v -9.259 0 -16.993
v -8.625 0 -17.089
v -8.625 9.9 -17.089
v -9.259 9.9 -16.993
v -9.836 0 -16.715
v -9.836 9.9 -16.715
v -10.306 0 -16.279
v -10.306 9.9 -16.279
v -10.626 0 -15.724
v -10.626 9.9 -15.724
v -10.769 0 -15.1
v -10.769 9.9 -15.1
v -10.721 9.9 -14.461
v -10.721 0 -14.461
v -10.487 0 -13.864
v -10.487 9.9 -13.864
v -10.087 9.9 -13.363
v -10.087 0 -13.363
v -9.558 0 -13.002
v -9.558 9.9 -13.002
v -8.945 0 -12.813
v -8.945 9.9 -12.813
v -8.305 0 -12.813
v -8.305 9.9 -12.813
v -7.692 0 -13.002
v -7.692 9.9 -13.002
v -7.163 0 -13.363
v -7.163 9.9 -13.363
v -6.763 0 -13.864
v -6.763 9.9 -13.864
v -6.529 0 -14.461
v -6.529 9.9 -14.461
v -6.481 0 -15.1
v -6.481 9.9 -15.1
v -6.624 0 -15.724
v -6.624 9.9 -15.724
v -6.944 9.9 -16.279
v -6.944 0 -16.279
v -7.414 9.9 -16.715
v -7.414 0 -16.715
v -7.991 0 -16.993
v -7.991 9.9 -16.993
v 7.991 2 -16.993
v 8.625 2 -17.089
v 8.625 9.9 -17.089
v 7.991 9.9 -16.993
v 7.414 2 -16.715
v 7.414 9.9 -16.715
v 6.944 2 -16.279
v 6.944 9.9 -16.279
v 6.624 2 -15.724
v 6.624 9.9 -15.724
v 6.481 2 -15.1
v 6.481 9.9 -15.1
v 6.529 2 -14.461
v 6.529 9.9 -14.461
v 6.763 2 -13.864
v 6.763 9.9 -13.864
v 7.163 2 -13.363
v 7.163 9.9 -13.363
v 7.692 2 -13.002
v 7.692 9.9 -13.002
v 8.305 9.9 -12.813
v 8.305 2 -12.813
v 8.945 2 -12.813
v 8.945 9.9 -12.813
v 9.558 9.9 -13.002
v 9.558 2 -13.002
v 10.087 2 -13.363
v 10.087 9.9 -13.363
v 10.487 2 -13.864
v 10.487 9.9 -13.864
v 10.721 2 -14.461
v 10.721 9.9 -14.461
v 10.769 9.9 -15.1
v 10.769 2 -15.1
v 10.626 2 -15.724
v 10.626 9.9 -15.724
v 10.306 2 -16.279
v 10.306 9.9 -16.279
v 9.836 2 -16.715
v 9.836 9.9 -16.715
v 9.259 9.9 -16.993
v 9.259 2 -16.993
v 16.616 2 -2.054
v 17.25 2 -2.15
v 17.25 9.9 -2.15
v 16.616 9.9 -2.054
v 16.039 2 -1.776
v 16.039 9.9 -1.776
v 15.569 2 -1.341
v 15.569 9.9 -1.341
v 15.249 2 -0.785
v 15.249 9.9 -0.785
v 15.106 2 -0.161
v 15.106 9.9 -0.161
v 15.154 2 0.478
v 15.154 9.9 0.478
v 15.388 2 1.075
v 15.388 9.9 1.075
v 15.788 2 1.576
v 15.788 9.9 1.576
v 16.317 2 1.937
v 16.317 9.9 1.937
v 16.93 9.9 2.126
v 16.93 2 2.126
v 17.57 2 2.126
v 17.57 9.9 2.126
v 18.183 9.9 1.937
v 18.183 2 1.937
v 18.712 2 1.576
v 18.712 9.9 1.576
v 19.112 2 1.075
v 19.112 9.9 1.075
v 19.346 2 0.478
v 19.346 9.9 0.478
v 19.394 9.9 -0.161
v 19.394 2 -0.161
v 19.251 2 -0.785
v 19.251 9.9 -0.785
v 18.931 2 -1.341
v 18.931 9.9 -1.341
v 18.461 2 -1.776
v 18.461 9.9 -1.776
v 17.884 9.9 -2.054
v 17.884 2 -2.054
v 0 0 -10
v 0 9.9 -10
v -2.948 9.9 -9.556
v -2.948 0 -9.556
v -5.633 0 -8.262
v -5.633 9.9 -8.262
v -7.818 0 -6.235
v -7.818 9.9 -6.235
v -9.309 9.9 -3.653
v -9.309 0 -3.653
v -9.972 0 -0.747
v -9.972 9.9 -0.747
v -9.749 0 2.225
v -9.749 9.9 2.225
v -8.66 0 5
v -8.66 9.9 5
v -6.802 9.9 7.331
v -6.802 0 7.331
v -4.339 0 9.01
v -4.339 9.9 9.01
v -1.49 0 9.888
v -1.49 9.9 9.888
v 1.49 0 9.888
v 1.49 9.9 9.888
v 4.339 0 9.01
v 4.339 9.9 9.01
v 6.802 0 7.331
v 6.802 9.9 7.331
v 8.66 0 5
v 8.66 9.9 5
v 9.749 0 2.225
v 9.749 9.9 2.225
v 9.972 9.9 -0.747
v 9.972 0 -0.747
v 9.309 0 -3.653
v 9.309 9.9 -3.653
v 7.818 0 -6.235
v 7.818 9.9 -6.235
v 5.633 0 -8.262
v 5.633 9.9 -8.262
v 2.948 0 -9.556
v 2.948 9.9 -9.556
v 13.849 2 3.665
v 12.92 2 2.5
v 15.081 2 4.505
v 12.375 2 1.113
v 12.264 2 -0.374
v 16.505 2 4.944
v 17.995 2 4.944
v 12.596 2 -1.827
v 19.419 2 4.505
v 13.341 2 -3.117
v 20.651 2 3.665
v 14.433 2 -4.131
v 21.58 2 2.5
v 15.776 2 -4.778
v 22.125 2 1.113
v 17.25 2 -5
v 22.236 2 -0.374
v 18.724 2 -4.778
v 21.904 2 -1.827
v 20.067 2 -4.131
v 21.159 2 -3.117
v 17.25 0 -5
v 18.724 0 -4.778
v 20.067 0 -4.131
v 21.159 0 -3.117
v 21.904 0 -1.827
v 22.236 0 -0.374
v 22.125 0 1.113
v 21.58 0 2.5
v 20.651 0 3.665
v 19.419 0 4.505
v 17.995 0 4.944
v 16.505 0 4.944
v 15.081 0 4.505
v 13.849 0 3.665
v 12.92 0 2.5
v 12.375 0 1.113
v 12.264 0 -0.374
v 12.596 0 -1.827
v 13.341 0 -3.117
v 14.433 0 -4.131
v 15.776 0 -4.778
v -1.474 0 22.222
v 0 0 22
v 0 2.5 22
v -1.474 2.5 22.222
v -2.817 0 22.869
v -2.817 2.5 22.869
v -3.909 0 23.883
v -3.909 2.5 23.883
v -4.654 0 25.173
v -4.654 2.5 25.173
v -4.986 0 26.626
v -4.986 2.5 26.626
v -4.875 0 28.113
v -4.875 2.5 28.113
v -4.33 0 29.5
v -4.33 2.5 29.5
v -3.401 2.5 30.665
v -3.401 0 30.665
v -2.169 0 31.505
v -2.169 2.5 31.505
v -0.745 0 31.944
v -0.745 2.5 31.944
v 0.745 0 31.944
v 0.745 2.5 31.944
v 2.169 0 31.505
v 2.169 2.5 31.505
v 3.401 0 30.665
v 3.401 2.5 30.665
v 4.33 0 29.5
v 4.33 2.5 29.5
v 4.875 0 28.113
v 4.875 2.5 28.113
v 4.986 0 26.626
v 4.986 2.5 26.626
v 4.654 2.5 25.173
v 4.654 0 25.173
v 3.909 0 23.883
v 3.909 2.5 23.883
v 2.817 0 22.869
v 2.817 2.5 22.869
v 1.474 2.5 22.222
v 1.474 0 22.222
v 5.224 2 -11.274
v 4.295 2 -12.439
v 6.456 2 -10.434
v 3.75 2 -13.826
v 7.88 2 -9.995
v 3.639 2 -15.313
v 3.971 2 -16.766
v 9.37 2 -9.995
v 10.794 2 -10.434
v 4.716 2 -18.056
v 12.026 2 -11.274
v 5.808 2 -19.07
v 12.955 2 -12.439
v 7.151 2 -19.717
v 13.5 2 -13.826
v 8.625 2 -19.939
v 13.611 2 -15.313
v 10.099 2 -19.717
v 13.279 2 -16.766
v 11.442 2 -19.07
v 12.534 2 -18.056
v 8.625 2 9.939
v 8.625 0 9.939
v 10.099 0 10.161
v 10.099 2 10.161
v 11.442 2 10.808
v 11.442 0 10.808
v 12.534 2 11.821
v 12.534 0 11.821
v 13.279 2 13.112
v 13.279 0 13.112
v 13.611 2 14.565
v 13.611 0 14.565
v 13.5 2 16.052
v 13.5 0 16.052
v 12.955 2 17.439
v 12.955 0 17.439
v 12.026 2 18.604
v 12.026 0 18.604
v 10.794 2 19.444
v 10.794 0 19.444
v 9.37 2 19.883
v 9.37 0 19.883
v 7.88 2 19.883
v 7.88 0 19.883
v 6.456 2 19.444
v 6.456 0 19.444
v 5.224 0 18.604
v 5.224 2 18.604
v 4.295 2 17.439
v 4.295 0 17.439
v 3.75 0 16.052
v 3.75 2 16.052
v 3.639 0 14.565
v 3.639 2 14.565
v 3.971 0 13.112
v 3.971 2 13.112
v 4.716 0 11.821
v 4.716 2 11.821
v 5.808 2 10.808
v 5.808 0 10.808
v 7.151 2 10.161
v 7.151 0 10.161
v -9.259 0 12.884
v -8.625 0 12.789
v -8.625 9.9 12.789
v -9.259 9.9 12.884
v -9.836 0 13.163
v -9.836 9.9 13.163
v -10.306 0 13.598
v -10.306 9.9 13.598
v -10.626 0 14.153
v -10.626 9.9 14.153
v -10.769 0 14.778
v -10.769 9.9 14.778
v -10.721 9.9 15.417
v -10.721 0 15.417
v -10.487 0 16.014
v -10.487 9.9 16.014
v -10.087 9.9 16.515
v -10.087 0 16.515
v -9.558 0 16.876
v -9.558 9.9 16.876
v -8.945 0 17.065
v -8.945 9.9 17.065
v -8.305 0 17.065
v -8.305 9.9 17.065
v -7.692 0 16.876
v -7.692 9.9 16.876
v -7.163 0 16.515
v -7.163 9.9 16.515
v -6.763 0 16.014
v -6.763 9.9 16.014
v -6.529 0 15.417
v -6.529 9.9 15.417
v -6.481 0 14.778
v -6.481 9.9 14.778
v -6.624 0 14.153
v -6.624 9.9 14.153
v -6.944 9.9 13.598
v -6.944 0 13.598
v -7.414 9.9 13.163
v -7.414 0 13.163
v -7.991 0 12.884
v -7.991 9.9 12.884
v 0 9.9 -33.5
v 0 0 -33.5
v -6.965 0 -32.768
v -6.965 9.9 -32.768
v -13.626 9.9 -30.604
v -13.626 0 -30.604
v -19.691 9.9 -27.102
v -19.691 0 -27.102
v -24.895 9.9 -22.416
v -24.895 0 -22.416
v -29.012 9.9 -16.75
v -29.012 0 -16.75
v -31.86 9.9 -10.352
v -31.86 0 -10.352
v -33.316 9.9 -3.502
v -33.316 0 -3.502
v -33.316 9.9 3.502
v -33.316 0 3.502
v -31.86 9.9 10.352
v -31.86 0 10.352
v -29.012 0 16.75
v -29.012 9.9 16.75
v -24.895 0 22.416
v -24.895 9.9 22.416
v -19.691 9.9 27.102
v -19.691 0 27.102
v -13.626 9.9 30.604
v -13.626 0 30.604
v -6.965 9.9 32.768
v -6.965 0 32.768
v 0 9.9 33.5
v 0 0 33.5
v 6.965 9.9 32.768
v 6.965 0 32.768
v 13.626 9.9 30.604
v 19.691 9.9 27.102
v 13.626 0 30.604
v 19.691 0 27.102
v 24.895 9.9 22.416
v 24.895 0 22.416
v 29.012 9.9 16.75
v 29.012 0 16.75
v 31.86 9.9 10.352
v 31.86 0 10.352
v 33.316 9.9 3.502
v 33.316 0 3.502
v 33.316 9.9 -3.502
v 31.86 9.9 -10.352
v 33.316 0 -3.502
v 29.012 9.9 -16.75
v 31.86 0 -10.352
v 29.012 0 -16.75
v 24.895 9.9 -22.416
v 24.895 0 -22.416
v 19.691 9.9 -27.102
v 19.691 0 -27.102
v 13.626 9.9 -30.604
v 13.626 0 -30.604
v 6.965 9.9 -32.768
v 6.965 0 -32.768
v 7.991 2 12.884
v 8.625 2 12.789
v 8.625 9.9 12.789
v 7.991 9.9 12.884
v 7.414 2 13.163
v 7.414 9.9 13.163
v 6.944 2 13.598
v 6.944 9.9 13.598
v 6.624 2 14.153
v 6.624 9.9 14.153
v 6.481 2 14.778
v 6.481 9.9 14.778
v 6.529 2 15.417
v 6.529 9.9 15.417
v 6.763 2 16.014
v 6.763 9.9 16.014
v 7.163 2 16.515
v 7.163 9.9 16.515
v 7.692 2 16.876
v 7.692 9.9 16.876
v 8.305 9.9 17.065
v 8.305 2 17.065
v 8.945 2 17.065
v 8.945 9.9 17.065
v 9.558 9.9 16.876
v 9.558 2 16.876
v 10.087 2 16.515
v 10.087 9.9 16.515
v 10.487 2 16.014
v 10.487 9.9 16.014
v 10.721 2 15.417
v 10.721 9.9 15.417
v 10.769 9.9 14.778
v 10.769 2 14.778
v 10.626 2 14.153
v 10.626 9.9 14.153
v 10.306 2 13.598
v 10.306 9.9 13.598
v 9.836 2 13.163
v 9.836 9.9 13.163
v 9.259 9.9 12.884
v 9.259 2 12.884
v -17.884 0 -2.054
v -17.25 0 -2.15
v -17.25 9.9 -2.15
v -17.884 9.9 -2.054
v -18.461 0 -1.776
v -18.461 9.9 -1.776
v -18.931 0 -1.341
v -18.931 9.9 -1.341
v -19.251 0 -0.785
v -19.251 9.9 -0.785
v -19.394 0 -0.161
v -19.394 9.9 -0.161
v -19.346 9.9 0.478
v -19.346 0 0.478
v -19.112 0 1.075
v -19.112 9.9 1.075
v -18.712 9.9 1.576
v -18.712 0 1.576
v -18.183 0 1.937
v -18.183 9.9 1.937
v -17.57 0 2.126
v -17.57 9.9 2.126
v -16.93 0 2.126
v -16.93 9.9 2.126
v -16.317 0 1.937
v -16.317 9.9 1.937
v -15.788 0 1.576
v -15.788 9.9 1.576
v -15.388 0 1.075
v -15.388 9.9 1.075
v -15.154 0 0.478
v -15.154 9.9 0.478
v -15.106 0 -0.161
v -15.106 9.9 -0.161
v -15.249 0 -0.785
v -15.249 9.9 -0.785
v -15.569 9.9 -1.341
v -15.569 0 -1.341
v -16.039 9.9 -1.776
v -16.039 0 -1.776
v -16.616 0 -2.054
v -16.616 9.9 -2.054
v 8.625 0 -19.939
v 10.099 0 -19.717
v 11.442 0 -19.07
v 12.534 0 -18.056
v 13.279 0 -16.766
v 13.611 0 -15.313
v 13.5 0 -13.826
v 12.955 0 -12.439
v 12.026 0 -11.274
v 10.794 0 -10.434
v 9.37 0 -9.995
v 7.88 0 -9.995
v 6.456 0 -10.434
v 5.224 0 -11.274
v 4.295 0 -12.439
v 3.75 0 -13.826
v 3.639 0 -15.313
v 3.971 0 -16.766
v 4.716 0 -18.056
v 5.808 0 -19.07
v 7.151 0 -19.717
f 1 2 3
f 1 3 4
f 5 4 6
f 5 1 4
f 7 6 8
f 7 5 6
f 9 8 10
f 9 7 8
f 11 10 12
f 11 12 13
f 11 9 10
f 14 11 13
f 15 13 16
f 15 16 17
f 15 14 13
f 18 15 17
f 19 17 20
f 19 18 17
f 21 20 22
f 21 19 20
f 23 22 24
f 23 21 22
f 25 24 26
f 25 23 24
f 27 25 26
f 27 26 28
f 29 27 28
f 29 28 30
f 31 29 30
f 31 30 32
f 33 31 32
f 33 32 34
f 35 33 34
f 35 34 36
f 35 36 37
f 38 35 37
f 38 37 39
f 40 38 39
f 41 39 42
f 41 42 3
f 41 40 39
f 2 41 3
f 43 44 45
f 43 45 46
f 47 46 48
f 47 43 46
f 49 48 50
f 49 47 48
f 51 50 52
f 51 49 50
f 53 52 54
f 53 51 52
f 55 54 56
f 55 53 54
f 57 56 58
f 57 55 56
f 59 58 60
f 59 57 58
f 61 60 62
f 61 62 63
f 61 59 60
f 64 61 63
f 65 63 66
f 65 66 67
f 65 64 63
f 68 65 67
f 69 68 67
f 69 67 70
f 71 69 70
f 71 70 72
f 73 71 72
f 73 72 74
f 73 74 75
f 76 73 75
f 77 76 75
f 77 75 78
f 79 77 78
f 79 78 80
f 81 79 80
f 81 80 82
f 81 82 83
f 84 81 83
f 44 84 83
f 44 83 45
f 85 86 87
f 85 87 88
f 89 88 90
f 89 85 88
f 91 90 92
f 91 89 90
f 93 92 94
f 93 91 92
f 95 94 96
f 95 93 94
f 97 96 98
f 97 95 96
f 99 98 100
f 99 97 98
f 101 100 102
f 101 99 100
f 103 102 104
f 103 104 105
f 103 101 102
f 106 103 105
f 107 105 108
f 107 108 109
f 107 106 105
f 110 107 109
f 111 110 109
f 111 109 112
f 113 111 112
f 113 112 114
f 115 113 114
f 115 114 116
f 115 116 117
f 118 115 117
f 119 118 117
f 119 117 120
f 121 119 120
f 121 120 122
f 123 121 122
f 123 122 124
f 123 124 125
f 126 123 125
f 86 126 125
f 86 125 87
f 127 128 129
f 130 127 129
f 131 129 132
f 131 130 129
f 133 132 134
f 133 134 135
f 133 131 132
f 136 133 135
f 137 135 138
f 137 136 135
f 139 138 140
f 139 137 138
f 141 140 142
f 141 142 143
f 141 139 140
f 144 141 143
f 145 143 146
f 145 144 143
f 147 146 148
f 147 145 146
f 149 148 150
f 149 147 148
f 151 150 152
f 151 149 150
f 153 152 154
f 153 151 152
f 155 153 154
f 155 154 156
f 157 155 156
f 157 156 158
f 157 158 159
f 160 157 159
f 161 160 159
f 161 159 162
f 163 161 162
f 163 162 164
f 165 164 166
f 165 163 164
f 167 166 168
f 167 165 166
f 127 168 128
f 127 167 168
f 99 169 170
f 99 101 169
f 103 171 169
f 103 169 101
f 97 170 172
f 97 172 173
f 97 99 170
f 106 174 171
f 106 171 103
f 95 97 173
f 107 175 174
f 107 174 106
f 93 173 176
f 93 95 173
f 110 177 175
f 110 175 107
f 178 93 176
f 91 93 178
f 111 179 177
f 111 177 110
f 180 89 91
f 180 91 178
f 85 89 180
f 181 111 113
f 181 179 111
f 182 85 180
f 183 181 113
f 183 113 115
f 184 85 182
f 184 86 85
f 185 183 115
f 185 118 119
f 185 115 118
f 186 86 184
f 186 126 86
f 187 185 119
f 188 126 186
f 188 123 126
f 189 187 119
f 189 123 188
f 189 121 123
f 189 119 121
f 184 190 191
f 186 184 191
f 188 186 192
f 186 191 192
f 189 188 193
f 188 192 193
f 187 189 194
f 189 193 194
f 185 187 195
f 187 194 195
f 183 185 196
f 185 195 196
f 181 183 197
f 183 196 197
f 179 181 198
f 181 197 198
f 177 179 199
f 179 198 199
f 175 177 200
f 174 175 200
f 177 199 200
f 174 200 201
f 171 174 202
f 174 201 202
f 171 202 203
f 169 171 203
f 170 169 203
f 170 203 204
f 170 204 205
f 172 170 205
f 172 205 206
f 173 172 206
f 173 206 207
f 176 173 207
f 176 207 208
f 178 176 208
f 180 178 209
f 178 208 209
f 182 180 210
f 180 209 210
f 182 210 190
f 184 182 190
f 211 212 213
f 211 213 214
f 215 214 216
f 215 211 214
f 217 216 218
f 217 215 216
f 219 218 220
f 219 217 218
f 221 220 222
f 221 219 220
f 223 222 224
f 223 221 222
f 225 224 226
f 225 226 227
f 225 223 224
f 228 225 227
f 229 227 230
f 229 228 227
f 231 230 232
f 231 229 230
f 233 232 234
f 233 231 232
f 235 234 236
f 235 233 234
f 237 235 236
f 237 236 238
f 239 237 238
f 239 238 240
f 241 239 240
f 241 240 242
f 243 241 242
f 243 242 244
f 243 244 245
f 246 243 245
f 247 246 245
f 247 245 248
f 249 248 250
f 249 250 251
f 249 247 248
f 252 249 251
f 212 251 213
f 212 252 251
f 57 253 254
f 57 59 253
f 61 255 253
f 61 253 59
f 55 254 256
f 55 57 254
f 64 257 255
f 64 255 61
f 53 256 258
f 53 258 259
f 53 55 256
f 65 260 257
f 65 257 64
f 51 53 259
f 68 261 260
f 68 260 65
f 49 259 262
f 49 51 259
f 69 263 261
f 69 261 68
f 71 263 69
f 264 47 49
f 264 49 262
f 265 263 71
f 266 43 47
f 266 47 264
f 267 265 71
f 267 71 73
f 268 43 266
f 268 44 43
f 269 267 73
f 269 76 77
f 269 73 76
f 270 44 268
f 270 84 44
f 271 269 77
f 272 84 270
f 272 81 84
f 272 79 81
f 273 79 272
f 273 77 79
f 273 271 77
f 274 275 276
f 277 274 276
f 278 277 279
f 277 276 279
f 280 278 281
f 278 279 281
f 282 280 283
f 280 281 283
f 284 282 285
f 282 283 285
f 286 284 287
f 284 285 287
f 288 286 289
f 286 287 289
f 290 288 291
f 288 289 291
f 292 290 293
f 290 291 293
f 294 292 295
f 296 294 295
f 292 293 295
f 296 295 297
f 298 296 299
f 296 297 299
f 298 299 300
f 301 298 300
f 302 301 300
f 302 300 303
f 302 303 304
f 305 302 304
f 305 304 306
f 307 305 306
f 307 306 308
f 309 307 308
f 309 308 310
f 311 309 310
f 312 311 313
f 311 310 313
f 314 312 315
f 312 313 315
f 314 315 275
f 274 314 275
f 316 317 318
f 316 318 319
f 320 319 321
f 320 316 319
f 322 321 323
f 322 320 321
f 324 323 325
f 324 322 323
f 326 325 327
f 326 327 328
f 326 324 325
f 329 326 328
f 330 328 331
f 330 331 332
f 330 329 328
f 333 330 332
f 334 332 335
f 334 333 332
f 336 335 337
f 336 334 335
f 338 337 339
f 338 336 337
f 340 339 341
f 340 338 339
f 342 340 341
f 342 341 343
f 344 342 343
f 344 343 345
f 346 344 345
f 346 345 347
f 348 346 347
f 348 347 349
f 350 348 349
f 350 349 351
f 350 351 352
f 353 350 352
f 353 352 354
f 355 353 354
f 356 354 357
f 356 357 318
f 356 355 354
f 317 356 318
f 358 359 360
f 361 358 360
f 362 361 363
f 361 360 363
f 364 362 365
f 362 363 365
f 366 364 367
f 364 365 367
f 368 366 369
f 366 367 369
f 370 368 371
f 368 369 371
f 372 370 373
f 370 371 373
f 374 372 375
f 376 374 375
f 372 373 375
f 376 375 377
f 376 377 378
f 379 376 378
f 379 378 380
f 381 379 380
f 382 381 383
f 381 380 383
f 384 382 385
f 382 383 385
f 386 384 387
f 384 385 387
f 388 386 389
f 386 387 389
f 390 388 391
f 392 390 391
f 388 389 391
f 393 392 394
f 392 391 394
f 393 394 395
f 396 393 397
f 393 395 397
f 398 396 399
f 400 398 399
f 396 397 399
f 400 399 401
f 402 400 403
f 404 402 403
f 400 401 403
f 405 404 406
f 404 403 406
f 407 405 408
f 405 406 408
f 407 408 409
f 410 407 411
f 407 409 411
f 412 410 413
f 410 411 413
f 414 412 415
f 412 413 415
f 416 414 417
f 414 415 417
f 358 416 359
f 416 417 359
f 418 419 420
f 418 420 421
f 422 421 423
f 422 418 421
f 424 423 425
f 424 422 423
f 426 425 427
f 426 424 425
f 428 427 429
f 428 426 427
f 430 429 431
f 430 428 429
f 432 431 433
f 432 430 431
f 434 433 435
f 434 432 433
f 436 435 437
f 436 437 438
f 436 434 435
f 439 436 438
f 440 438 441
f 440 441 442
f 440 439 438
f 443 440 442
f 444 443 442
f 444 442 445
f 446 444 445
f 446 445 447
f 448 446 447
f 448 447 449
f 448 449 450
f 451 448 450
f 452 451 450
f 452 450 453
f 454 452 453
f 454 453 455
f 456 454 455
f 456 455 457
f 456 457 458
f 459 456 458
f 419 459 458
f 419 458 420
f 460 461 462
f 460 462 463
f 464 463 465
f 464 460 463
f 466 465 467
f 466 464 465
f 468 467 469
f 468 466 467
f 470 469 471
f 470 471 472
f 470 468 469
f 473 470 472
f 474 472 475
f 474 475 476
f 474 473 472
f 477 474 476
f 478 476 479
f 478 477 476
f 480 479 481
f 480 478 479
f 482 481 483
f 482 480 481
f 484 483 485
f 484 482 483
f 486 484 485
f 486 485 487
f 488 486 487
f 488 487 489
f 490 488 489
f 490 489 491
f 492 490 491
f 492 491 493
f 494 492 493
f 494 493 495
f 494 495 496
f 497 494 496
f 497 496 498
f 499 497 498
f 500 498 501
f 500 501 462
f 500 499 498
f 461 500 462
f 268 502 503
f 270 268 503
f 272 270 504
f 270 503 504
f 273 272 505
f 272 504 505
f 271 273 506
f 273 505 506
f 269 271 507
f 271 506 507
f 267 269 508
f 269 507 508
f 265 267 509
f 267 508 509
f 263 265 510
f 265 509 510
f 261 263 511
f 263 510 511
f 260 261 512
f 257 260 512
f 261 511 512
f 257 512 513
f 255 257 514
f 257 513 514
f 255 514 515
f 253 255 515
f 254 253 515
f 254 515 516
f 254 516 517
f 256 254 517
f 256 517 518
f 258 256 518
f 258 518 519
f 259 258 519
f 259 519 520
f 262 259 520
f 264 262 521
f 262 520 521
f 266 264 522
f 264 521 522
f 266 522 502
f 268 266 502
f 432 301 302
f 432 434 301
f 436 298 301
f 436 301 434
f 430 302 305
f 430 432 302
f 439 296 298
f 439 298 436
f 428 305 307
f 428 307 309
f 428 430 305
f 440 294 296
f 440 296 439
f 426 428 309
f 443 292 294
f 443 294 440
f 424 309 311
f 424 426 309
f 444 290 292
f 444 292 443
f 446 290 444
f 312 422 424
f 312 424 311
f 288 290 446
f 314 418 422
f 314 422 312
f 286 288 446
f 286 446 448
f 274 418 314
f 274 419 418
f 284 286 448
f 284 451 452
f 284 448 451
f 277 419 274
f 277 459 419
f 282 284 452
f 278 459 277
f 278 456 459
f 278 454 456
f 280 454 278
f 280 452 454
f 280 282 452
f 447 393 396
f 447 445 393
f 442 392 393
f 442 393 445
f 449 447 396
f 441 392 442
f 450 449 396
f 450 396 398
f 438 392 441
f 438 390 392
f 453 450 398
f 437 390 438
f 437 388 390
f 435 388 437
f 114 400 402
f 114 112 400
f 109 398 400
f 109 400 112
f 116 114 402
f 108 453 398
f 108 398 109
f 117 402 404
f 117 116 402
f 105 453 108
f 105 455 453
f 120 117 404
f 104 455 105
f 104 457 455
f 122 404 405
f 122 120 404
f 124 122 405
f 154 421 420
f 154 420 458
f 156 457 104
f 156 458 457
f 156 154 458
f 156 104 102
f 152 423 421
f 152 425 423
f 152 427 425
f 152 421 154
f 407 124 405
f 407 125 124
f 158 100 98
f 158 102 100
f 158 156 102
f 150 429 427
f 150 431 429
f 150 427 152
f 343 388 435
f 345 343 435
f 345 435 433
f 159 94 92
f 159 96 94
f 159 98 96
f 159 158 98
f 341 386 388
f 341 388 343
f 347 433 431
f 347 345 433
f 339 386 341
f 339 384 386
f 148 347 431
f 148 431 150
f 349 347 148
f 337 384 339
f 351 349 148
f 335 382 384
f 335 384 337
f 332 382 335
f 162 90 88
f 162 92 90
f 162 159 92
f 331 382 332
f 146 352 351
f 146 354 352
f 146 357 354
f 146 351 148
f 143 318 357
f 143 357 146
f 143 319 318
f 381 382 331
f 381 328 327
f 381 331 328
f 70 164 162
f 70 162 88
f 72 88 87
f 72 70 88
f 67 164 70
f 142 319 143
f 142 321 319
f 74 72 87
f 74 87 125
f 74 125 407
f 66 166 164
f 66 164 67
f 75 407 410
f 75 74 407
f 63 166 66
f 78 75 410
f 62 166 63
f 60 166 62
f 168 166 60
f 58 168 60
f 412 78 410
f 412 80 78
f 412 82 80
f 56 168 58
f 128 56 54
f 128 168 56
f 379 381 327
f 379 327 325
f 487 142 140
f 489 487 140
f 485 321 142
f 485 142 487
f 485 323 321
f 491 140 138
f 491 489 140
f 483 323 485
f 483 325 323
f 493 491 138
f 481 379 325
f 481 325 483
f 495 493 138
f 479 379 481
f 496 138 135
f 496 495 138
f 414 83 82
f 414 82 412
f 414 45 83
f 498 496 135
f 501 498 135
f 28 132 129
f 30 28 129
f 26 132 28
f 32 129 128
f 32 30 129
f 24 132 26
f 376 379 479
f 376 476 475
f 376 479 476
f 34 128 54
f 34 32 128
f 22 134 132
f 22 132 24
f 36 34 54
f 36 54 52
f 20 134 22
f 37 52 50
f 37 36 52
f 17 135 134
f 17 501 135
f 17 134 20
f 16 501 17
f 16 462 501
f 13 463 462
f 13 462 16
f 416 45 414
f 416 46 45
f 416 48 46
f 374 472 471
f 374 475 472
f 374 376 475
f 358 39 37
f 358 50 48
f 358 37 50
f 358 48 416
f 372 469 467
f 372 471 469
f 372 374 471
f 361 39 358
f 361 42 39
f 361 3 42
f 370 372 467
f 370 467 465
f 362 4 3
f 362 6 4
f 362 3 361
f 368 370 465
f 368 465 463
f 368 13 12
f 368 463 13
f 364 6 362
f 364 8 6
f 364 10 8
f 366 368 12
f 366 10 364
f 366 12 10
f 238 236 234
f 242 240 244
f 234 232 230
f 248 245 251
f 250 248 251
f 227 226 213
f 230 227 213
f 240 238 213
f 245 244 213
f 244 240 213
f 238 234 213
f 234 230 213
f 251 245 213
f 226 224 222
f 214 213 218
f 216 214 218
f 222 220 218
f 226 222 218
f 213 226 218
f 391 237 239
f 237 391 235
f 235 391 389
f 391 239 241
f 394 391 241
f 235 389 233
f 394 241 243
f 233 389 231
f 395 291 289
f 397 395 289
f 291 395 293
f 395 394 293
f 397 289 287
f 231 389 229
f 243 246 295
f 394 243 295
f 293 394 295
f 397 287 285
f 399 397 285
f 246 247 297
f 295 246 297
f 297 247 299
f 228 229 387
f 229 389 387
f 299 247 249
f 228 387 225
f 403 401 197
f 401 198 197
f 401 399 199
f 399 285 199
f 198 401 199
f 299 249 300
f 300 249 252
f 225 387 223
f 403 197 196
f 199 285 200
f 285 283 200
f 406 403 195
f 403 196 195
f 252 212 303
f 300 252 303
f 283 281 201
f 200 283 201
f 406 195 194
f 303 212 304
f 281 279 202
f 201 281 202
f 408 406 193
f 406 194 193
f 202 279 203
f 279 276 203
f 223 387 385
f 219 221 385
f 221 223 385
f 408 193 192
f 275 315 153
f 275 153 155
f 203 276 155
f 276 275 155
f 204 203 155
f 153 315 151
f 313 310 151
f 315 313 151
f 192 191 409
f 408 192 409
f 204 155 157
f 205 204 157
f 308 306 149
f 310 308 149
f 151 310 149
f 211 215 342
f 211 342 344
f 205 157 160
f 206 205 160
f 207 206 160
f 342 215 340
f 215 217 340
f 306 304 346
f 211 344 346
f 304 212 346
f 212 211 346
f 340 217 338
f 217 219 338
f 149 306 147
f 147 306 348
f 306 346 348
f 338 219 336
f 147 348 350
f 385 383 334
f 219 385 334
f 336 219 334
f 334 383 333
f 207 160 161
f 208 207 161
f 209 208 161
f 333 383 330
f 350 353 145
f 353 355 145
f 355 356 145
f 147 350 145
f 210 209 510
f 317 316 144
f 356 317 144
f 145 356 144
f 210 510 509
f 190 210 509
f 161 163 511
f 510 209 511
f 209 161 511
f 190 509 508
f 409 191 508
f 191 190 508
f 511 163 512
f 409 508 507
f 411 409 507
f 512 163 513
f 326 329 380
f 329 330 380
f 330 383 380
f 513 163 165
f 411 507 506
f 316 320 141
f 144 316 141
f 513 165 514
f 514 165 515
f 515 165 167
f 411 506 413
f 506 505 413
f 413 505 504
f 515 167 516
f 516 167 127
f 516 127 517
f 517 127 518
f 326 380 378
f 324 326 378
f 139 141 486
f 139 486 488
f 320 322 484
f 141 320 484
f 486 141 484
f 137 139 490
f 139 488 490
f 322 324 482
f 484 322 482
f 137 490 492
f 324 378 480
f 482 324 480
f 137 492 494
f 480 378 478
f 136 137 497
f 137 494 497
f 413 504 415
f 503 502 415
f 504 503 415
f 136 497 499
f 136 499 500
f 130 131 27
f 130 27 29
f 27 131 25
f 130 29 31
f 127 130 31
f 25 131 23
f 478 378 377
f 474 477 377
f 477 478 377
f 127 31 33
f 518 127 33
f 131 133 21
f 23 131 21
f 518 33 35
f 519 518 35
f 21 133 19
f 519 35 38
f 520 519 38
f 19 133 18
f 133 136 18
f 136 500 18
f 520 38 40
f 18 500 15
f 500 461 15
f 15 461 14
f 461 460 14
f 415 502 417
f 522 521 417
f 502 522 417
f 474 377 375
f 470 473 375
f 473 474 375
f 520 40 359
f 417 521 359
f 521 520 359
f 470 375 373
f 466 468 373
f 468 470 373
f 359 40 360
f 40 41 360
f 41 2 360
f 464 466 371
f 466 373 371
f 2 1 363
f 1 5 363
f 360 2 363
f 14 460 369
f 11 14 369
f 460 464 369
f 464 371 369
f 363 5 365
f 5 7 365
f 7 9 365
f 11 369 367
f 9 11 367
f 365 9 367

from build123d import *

# Parameters (mm, degrees)
SKETCH_1_R          = 33.5
SKETCH_1_R_2        = 2.15
SKETCH_1_R_3        = 10
EXTRUDE_1_DEPTH     = 9.9
SKETCH_2_R          = 5
CUT_EXTRUDE_3_DEPTH = 2.5
SKETCH_5_R          = 5
CUT_EXTRUDE_5_DEPTH = 2


with BuildPart() as part:
    # 草图1 → 凸台-拉伸1 (new body)
    with BuildSketch(Plane(origin=(0, 0, 0), x_dir=(1, 0, 0), z_dir=(0, 1, 0))):
        with Locations(Location((0, 0, 0), (0, 0, 90))):
            Circle(SKETCH_1_R)
        with Locations(Location((8.625, 14.938938215, 0), (0, 0, 90))):
            Circle(SKETCH_1_R_2, mode=Mode.SUBTRACT)
        with Locations(Location((0, 0, 0), (0, 0, 90))):
            Circle(SKETCH_1_R_3, mode=Mode.SUBTRACT)
        with Locations(Location((17.25, 0, 0), (0, 0, 90))):
            Circle(SKETCH_1_R_2, mode=Mode.SUBTRACT)
        with Locations(Location((8.625, -14.938938215, 0), (0, 0, 90))):
            Circle(SKETCH_1_R_2, mode=Mode.SUBTRACT)
        with Locations(Location((-8.625, -14.938938215, 0), (0, 0, 90))):
            Circle(SKETCH_1_R_2, mode=Mode.SUBTRACT)
        with Locations(Location((-17.25, 0, 0), (0, 0, 90))):
            Circle(SKETCH_1_R_2, mode=Mode.SUBTRACT)
        with Locations(Location((-8.625, 14.938938215, 0), (0, 0, 90))):
            Circle(SKETCH_1_R_2, mode=Mode.SUBTRACT)
    extrude(amount=EXTRUDE_1_DEPTH)

    # 草图2 → 切除-拉伸3 (cut)
    with BuildSketch(Plane(origin=(0, 0, 0), x_dir=(1, 0, 0), z_dir=(0, 1, 0))):
        with Locations(Location((0, -27, 0), (0, 0, 90))):
            Circle(SKETCH_2_R)
    extrude(amount=CUT_EXTRUDE_3_DEPTH, mode=Mode.SUBTRACT)

    # 草图5 → 切除-拉伸5 (cut)
    with BuildSketch(Plane.XZ):
        with Locations(Location((8.625, 14.938938215, 0), (0, 0, 270))):
            Circle(SKETCH_5_R)
        with Locations(Location((17.25, 0, 0), (0, 0, 270))):
            Circle(SKETCH_5_R)
        with Locations(Location((8.625, -14.938938215, 0), (0, 0, 270))):
            Circle(SKETCH_5_R)
    extrude(amount=-CUT_EXTRUDE_5_DEPTH, mode=Mode.SUBTRACT)


solid = part.part
